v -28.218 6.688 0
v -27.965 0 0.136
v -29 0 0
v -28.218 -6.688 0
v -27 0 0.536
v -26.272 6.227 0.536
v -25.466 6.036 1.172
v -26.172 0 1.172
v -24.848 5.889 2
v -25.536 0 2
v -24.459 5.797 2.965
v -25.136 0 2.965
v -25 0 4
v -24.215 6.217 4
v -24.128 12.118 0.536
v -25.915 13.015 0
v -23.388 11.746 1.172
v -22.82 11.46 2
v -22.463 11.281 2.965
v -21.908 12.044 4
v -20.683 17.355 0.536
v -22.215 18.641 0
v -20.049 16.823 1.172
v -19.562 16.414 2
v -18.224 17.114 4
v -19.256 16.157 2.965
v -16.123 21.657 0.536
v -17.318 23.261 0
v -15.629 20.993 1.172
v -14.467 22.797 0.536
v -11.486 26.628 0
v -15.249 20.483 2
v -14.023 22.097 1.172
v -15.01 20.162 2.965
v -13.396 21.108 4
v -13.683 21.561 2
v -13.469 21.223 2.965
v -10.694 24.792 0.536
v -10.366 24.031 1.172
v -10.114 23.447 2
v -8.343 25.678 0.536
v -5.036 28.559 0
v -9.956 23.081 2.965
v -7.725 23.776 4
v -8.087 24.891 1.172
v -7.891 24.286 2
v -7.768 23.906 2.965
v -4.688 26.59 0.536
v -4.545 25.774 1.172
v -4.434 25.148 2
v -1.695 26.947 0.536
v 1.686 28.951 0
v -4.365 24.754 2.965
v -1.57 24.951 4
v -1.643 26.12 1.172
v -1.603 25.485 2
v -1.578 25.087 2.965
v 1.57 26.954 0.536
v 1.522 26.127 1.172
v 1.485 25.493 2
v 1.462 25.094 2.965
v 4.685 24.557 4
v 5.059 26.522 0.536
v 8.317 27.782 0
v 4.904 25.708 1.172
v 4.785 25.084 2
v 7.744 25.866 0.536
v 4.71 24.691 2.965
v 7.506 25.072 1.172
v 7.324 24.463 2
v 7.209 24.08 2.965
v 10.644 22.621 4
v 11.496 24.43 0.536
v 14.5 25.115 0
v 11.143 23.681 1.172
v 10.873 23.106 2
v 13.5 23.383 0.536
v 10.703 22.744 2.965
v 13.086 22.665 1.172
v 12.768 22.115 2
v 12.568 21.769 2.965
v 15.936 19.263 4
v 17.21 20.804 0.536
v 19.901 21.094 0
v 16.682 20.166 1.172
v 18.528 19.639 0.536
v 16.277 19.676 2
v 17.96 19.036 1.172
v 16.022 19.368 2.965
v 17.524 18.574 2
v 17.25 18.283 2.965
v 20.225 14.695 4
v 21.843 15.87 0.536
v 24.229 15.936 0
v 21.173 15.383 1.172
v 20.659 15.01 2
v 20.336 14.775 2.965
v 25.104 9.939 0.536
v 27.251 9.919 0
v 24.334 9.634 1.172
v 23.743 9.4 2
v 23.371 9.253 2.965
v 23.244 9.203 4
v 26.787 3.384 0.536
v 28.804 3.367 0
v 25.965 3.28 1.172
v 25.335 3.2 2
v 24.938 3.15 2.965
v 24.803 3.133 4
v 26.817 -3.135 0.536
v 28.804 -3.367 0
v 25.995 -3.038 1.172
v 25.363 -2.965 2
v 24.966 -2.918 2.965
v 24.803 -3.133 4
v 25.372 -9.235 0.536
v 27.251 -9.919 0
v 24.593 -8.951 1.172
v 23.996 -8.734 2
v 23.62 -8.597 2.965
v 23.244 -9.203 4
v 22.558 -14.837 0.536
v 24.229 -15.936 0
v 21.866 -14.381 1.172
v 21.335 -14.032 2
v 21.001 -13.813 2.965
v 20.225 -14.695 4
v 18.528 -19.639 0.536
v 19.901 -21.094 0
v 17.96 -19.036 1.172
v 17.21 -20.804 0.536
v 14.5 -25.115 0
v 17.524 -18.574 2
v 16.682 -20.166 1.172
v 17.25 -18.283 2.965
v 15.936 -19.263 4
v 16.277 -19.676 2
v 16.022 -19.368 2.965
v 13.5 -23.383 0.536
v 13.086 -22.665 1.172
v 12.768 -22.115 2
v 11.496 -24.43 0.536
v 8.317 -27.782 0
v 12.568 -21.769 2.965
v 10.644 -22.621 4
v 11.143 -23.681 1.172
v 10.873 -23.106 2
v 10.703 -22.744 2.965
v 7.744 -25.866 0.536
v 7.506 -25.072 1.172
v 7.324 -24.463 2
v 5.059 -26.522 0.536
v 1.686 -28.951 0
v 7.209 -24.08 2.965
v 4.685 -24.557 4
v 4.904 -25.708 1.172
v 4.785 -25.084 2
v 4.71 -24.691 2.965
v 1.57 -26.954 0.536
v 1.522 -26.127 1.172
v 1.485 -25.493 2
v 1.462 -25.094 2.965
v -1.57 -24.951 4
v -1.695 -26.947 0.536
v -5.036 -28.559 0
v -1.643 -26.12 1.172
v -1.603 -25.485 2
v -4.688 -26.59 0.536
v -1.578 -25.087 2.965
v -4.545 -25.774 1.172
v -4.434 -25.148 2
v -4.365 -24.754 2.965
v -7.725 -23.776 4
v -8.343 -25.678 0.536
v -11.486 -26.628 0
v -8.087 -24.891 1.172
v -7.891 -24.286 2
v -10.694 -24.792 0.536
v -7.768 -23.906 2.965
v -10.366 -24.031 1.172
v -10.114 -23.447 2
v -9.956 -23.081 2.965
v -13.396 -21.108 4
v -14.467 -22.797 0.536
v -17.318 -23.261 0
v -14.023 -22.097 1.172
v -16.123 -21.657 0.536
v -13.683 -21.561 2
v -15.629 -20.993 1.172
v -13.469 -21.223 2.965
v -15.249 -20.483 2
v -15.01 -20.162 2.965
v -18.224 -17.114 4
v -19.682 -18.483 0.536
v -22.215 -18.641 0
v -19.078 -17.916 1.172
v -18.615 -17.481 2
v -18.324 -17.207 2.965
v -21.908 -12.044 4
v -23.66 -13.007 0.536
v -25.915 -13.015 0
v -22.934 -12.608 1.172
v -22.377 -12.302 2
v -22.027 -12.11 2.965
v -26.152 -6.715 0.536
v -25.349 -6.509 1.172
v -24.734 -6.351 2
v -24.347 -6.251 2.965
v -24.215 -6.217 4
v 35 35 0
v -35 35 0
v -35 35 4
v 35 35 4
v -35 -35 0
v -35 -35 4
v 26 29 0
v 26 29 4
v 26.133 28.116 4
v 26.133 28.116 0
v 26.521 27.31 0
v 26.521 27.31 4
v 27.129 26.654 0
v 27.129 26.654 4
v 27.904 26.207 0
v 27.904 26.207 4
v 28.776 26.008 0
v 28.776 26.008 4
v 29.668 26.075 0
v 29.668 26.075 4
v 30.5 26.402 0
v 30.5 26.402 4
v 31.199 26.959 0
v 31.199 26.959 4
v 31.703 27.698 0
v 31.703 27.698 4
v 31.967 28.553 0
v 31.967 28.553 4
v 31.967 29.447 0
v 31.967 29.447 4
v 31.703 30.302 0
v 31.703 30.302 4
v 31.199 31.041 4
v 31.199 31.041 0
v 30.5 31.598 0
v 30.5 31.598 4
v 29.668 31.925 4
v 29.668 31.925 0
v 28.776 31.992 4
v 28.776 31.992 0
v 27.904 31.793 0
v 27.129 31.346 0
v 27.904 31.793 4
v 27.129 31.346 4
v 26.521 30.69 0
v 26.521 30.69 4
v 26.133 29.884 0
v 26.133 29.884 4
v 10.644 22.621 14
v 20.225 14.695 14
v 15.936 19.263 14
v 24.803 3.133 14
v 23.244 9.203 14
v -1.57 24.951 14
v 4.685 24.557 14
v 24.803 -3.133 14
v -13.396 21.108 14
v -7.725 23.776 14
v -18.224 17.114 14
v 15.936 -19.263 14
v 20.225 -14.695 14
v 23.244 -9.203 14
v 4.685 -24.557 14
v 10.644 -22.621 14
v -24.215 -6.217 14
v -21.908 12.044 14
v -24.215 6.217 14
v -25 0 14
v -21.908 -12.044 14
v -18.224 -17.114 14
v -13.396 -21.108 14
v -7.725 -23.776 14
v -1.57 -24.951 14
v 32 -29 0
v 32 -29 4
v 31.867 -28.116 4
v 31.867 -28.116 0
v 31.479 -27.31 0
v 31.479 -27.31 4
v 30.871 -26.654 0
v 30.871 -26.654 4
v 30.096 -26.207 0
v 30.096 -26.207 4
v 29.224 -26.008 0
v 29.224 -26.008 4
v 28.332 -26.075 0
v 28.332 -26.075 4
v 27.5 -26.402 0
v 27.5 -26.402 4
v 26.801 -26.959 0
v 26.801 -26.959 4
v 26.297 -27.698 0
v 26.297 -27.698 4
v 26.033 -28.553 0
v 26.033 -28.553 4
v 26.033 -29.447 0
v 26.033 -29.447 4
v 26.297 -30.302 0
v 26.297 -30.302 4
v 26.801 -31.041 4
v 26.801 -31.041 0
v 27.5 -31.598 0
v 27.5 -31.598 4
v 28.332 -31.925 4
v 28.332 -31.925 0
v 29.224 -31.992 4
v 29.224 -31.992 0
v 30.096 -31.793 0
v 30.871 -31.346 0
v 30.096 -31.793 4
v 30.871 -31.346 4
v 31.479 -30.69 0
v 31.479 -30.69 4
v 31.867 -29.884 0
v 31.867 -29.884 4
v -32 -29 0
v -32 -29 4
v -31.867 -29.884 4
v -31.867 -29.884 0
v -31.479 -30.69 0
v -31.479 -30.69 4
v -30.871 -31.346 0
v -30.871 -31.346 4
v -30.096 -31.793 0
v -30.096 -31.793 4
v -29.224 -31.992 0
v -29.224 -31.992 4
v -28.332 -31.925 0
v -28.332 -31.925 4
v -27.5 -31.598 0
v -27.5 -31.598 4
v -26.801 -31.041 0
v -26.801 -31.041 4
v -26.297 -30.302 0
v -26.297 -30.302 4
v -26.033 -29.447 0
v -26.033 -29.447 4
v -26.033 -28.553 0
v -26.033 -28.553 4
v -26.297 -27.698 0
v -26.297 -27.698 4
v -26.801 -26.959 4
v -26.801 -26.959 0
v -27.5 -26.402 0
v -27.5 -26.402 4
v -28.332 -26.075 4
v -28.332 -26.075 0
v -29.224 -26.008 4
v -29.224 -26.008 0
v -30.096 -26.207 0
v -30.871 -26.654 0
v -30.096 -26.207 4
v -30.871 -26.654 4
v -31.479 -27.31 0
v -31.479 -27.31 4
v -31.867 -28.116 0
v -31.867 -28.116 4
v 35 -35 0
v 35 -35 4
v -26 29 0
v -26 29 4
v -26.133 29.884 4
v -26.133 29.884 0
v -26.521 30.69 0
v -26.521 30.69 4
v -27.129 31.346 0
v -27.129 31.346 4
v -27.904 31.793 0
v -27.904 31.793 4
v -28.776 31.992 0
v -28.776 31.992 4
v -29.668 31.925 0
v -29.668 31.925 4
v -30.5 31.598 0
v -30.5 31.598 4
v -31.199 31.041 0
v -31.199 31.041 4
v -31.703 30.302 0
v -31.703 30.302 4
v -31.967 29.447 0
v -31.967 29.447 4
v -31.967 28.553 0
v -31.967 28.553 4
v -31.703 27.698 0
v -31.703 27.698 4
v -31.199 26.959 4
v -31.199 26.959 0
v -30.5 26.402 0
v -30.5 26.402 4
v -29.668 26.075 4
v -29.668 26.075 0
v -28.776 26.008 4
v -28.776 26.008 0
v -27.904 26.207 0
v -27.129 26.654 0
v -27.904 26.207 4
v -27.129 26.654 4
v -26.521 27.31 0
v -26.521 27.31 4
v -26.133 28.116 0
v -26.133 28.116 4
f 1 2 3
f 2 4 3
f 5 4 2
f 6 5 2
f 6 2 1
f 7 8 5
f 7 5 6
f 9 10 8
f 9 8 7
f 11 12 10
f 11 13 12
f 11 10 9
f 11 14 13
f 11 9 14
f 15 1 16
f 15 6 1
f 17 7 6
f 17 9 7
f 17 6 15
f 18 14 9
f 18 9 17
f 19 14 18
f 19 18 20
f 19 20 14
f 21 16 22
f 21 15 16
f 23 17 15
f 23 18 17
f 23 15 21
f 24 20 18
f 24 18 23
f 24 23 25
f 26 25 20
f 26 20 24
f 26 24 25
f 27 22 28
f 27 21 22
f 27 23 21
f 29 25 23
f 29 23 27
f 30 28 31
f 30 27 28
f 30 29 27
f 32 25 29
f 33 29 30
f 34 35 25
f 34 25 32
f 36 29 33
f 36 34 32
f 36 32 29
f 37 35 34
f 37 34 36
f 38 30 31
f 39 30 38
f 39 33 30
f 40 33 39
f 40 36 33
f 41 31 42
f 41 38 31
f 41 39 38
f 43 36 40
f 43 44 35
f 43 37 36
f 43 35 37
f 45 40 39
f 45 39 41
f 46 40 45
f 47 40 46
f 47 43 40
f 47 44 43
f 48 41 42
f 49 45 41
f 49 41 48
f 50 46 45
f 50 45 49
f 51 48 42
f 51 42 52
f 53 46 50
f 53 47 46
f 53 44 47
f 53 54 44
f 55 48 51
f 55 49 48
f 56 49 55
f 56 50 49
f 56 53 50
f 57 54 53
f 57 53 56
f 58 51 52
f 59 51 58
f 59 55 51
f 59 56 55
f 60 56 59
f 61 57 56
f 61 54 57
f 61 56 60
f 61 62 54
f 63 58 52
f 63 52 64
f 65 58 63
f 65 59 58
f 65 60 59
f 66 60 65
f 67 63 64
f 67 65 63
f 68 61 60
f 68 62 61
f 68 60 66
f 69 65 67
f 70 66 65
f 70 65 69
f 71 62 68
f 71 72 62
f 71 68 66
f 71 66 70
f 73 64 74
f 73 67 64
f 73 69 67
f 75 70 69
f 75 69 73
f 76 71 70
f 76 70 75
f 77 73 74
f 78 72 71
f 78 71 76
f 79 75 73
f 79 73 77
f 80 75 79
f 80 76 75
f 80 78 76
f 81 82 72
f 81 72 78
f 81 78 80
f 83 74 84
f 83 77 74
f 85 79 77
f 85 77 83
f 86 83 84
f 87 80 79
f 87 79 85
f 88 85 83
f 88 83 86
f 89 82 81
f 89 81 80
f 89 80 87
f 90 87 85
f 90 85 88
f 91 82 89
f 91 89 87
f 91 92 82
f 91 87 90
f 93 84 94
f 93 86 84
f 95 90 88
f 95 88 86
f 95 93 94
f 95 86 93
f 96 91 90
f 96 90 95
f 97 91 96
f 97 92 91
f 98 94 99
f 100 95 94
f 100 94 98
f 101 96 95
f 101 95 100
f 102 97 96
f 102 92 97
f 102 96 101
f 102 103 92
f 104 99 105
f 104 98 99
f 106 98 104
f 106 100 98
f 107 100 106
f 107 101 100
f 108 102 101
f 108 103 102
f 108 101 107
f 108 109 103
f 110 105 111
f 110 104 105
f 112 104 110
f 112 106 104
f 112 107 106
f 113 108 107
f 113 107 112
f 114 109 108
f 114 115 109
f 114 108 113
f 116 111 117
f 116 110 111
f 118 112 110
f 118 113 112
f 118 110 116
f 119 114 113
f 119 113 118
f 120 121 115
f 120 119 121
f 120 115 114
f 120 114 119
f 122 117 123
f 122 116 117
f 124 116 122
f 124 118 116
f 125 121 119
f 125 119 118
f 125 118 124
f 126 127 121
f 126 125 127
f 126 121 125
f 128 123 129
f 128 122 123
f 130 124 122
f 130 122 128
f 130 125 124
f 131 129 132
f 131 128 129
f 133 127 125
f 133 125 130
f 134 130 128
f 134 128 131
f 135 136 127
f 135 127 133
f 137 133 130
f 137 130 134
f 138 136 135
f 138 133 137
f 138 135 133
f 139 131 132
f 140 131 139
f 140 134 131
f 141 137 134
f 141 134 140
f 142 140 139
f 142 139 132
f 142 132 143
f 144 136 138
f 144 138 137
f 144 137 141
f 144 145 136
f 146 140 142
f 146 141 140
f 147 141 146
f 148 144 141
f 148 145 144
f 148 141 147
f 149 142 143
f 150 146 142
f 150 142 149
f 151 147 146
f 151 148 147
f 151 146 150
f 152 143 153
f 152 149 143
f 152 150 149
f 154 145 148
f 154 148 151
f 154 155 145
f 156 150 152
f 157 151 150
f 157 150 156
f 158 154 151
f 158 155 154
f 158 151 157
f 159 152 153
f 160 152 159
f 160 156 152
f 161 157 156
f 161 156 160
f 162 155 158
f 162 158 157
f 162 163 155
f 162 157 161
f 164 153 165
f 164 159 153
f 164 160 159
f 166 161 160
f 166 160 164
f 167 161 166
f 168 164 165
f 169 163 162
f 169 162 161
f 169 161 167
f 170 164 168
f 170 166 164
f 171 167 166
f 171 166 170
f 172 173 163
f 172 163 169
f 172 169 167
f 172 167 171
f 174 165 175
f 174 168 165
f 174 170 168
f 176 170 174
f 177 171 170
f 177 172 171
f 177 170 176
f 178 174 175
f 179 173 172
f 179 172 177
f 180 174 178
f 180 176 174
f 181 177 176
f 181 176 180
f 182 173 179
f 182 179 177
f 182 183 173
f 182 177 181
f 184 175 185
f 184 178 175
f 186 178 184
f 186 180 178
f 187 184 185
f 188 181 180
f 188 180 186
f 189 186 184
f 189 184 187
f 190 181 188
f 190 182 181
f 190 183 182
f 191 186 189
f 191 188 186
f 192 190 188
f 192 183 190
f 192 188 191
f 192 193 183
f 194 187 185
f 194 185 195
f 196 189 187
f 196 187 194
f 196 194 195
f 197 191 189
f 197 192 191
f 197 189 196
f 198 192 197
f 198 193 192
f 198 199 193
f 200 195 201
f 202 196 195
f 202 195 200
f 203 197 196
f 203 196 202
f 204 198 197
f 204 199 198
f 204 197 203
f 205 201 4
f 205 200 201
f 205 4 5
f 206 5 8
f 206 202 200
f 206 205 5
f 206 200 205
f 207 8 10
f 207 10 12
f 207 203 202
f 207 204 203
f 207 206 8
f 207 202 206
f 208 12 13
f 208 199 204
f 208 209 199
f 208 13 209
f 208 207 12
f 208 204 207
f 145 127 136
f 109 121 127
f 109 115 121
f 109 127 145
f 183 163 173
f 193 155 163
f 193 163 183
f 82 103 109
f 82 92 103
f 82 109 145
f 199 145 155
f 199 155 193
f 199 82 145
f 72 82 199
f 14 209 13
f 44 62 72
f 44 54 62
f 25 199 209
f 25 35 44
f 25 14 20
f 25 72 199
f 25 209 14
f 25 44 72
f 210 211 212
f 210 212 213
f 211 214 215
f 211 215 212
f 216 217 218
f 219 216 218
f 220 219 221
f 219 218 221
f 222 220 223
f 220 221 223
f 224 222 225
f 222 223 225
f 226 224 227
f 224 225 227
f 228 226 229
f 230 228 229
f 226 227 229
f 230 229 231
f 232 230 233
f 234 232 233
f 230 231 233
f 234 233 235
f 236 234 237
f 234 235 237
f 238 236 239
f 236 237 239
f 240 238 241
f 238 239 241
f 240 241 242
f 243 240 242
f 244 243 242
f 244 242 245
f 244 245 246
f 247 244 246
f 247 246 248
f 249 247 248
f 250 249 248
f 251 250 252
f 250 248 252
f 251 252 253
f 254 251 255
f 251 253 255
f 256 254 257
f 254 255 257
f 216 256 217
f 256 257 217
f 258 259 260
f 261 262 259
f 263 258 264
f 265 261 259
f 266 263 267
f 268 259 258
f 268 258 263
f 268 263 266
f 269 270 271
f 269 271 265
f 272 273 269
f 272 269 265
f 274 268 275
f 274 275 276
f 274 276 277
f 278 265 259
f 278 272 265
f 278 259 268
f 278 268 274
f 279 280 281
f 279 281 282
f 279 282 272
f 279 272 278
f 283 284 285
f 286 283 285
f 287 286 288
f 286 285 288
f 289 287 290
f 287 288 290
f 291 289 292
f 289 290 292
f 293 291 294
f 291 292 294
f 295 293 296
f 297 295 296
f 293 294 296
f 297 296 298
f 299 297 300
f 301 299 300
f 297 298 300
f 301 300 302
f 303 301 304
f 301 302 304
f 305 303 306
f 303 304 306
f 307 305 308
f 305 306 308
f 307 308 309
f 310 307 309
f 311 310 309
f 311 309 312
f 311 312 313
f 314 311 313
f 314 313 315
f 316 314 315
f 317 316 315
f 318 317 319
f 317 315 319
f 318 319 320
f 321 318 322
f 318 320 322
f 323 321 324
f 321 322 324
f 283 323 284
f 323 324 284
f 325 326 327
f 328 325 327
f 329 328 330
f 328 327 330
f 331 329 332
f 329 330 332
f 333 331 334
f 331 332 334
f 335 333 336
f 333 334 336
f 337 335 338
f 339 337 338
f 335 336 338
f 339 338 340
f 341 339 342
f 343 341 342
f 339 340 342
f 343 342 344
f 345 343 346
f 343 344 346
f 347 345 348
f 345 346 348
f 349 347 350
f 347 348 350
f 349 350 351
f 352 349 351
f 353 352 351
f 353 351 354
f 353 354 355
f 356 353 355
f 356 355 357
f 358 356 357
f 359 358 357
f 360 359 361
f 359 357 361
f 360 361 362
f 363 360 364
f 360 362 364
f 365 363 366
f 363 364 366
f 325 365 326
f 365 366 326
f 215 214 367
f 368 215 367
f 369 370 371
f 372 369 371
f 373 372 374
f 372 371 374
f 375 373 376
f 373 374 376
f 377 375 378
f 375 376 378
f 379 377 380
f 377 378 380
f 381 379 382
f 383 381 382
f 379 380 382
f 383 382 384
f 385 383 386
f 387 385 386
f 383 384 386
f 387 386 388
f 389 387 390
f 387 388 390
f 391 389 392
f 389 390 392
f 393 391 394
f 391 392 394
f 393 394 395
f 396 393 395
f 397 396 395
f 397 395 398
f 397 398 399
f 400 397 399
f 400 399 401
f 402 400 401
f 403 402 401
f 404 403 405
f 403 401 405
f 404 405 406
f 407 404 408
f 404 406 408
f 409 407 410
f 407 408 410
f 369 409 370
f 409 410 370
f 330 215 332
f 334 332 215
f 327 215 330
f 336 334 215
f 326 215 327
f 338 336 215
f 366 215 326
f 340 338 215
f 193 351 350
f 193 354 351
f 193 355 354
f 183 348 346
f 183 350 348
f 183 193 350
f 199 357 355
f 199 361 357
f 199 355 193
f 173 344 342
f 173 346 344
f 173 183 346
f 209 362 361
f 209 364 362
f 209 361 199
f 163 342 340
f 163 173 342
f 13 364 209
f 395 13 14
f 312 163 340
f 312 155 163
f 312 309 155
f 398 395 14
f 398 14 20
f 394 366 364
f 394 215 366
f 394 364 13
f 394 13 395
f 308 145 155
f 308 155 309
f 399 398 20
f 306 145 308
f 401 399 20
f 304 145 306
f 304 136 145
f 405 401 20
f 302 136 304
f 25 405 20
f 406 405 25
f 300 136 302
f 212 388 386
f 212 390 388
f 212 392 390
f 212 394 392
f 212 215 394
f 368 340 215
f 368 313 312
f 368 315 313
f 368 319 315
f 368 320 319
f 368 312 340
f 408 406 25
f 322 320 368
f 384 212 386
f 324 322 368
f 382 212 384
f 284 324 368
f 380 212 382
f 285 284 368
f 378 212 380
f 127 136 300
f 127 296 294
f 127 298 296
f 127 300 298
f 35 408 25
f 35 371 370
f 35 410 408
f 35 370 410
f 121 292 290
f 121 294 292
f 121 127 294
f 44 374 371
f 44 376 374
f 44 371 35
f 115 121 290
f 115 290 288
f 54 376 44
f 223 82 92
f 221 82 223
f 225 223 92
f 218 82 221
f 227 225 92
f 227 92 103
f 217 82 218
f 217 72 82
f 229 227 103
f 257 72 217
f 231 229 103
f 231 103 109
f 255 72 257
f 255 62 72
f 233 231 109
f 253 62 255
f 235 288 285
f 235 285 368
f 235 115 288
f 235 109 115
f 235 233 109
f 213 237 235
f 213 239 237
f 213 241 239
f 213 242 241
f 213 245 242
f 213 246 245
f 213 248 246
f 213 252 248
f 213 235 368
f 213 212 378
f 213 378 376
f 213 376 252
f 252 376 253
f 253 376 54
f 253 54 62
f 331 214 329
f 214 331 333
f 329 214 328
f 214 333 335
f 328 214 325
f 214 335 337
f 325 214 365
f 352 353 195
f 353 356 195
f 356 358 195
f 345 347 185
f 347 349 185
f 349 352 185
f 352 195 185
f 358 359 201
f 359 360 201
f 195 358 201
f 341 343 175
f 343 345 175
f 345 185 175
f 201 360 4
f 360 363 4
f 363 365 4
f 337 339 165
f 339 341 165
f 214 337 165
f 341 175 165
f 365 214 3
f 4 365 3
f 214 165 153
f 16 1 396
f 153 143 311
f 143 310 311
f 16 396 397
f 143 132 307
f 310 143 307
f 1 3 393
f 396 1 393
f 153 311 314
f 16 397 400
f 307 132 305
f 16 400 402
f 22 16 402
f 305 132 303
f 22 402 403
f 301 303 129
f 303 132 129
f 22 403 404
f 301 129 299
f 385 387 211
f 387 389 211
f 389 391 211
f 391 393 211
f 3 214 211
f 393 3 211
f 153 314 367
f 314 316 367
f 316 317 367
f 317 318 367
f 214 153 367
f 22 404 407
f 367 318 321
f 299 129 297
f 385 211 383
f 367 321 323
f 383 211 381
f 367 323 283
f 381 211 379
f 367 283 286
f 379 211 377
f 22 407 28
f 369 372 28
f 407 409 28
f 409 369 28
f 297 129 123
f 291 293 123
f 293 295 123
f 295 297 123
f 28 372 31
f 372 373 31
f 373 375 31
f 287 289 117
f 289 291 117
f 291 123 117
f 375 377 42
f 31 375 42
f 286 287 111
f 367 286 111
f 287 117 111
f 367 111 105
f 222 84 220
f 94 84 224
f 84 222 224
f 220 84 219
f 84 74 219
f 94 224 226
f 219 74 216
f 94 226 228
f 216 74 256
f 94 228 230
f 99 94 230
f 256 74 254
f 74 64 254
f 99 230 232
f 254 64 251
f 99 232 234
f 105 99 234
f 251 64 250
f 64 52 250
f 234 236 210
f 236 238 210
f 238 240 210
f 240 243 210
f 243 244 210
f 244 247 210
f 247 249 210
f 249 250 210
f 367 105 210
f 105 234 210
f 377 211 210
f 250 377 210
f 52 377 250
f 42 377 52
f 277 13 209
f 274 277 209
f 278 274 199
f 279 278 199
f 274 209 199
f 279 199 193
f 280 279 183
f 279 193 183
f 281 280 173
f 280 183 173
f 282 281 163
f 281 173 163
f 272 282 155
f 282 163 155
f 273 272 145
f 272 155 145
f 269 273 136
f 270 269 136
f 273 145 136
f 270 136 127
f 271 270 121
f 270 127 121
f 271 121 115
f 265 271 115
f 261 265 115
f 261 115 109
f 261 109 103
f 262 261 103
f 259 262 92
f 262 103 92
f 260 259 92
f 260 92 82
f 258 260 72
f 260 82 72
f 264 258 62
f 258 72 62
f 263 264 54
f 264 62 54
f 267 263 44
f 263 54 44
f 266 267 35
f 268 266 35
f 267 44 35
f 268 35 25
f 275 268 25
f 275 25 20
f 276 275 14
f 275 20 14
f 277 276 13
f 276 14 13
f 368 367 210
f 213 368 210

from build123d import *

# Parameters (mm, degrees)
SKETCH1_W           = 70
SKETCH1_H           = 70
BOSS_EXTRUDE1_DEPTH = 4
SKETCH2_R           = 25
BOSS_EXTRUDE2_DEPTH = 10
SKETCH3_R           = 25
CUT_EXTRUDE1_DEPTH  = 4
FILLET1_R           = 4
SKETCH4_R           = 3.000311633
CUT_EXTRUDE2_DEPTH  = 4


with BuildPart() as part:
    # Sketch1 → Boss-Extrude1 (new body)
    with BuildSketch(Plane.XY):
        Rectangle(SKETCH1_W, SKETCH1_H)
    extrude(amount=BOSS_EXTRUDE1_DEPTH)

    # Sketch2 → Boss-Extrude2 (add)
    with BuildSketch(Plane.XY.offset(4)):
        with Locations(Location((0, 0, 0), (0, 0, 180))):
            Circle(SKETCH2_R)
    extrude(amount=BOSS_EXTRUDE2_DEPTH)

    # Sketch3 → Cut-Extrude1 (cut)
    with BuildSketch(Plane(origin=(0, 0, 0), x_dir=(-1, 0, 0), z_dir=(0, 0, -1))):
        Circle(SKETCH3_R)
    extrude(amount=-CUT_EXTRUDE1_DEPTH, mode=Mode.SUBTRACT)


with BuildPart() as cut_extrude1_piece_1:
    # of the separate pieces the step leaves, piece 1, a body of its own (cut_extrude1_pieces)
    add(part.part.solids().sort_by_distance((-25, 0, 14))[0])


with BuildPart() as cut_extrude1_piece_2:
    # of the separate pieces the step leaves, piece 2, a body of its own (cut_extrude1_pieces)
    add(part.part.solids().sort_by_distance((35, 35, 0))[0])

    # Fillet1
    fillet1_edges = [cut_extrude1_piece_2.edges().sort_by_distance(p)[0] for p in [
        (25, 0, 0),
    ]]
    fillet(fillet1_edges, radius=FILLET1_R - 0.0001)  # a hair under: the kernel refuses the full size

    # Sketch4 → Cut-Extrude2 (cut)
    with BuildSketch(Plane.XY.offset(4)):
        with Locations((-29, 29)):
            Circle(SKETCH4_R)
        with Locations(Location((29, 29, 0), (0, 0, 180))):
            Circle(SKETCH4_R)
        with Locations(Location((-29, -29, 0), (0, 0, 180))):
            Circle(SKETCH4_R)
        with Locations((29, -29)):
            Circle(SKETCH4_R)
    extrude(amount=-CUT_EXTRUDE2_DEPTH, mode=Mode.SUBTRACT)


solid = Compound([cut_extrude1_piece_1.part, cut_extrude1_piece_2.part])
